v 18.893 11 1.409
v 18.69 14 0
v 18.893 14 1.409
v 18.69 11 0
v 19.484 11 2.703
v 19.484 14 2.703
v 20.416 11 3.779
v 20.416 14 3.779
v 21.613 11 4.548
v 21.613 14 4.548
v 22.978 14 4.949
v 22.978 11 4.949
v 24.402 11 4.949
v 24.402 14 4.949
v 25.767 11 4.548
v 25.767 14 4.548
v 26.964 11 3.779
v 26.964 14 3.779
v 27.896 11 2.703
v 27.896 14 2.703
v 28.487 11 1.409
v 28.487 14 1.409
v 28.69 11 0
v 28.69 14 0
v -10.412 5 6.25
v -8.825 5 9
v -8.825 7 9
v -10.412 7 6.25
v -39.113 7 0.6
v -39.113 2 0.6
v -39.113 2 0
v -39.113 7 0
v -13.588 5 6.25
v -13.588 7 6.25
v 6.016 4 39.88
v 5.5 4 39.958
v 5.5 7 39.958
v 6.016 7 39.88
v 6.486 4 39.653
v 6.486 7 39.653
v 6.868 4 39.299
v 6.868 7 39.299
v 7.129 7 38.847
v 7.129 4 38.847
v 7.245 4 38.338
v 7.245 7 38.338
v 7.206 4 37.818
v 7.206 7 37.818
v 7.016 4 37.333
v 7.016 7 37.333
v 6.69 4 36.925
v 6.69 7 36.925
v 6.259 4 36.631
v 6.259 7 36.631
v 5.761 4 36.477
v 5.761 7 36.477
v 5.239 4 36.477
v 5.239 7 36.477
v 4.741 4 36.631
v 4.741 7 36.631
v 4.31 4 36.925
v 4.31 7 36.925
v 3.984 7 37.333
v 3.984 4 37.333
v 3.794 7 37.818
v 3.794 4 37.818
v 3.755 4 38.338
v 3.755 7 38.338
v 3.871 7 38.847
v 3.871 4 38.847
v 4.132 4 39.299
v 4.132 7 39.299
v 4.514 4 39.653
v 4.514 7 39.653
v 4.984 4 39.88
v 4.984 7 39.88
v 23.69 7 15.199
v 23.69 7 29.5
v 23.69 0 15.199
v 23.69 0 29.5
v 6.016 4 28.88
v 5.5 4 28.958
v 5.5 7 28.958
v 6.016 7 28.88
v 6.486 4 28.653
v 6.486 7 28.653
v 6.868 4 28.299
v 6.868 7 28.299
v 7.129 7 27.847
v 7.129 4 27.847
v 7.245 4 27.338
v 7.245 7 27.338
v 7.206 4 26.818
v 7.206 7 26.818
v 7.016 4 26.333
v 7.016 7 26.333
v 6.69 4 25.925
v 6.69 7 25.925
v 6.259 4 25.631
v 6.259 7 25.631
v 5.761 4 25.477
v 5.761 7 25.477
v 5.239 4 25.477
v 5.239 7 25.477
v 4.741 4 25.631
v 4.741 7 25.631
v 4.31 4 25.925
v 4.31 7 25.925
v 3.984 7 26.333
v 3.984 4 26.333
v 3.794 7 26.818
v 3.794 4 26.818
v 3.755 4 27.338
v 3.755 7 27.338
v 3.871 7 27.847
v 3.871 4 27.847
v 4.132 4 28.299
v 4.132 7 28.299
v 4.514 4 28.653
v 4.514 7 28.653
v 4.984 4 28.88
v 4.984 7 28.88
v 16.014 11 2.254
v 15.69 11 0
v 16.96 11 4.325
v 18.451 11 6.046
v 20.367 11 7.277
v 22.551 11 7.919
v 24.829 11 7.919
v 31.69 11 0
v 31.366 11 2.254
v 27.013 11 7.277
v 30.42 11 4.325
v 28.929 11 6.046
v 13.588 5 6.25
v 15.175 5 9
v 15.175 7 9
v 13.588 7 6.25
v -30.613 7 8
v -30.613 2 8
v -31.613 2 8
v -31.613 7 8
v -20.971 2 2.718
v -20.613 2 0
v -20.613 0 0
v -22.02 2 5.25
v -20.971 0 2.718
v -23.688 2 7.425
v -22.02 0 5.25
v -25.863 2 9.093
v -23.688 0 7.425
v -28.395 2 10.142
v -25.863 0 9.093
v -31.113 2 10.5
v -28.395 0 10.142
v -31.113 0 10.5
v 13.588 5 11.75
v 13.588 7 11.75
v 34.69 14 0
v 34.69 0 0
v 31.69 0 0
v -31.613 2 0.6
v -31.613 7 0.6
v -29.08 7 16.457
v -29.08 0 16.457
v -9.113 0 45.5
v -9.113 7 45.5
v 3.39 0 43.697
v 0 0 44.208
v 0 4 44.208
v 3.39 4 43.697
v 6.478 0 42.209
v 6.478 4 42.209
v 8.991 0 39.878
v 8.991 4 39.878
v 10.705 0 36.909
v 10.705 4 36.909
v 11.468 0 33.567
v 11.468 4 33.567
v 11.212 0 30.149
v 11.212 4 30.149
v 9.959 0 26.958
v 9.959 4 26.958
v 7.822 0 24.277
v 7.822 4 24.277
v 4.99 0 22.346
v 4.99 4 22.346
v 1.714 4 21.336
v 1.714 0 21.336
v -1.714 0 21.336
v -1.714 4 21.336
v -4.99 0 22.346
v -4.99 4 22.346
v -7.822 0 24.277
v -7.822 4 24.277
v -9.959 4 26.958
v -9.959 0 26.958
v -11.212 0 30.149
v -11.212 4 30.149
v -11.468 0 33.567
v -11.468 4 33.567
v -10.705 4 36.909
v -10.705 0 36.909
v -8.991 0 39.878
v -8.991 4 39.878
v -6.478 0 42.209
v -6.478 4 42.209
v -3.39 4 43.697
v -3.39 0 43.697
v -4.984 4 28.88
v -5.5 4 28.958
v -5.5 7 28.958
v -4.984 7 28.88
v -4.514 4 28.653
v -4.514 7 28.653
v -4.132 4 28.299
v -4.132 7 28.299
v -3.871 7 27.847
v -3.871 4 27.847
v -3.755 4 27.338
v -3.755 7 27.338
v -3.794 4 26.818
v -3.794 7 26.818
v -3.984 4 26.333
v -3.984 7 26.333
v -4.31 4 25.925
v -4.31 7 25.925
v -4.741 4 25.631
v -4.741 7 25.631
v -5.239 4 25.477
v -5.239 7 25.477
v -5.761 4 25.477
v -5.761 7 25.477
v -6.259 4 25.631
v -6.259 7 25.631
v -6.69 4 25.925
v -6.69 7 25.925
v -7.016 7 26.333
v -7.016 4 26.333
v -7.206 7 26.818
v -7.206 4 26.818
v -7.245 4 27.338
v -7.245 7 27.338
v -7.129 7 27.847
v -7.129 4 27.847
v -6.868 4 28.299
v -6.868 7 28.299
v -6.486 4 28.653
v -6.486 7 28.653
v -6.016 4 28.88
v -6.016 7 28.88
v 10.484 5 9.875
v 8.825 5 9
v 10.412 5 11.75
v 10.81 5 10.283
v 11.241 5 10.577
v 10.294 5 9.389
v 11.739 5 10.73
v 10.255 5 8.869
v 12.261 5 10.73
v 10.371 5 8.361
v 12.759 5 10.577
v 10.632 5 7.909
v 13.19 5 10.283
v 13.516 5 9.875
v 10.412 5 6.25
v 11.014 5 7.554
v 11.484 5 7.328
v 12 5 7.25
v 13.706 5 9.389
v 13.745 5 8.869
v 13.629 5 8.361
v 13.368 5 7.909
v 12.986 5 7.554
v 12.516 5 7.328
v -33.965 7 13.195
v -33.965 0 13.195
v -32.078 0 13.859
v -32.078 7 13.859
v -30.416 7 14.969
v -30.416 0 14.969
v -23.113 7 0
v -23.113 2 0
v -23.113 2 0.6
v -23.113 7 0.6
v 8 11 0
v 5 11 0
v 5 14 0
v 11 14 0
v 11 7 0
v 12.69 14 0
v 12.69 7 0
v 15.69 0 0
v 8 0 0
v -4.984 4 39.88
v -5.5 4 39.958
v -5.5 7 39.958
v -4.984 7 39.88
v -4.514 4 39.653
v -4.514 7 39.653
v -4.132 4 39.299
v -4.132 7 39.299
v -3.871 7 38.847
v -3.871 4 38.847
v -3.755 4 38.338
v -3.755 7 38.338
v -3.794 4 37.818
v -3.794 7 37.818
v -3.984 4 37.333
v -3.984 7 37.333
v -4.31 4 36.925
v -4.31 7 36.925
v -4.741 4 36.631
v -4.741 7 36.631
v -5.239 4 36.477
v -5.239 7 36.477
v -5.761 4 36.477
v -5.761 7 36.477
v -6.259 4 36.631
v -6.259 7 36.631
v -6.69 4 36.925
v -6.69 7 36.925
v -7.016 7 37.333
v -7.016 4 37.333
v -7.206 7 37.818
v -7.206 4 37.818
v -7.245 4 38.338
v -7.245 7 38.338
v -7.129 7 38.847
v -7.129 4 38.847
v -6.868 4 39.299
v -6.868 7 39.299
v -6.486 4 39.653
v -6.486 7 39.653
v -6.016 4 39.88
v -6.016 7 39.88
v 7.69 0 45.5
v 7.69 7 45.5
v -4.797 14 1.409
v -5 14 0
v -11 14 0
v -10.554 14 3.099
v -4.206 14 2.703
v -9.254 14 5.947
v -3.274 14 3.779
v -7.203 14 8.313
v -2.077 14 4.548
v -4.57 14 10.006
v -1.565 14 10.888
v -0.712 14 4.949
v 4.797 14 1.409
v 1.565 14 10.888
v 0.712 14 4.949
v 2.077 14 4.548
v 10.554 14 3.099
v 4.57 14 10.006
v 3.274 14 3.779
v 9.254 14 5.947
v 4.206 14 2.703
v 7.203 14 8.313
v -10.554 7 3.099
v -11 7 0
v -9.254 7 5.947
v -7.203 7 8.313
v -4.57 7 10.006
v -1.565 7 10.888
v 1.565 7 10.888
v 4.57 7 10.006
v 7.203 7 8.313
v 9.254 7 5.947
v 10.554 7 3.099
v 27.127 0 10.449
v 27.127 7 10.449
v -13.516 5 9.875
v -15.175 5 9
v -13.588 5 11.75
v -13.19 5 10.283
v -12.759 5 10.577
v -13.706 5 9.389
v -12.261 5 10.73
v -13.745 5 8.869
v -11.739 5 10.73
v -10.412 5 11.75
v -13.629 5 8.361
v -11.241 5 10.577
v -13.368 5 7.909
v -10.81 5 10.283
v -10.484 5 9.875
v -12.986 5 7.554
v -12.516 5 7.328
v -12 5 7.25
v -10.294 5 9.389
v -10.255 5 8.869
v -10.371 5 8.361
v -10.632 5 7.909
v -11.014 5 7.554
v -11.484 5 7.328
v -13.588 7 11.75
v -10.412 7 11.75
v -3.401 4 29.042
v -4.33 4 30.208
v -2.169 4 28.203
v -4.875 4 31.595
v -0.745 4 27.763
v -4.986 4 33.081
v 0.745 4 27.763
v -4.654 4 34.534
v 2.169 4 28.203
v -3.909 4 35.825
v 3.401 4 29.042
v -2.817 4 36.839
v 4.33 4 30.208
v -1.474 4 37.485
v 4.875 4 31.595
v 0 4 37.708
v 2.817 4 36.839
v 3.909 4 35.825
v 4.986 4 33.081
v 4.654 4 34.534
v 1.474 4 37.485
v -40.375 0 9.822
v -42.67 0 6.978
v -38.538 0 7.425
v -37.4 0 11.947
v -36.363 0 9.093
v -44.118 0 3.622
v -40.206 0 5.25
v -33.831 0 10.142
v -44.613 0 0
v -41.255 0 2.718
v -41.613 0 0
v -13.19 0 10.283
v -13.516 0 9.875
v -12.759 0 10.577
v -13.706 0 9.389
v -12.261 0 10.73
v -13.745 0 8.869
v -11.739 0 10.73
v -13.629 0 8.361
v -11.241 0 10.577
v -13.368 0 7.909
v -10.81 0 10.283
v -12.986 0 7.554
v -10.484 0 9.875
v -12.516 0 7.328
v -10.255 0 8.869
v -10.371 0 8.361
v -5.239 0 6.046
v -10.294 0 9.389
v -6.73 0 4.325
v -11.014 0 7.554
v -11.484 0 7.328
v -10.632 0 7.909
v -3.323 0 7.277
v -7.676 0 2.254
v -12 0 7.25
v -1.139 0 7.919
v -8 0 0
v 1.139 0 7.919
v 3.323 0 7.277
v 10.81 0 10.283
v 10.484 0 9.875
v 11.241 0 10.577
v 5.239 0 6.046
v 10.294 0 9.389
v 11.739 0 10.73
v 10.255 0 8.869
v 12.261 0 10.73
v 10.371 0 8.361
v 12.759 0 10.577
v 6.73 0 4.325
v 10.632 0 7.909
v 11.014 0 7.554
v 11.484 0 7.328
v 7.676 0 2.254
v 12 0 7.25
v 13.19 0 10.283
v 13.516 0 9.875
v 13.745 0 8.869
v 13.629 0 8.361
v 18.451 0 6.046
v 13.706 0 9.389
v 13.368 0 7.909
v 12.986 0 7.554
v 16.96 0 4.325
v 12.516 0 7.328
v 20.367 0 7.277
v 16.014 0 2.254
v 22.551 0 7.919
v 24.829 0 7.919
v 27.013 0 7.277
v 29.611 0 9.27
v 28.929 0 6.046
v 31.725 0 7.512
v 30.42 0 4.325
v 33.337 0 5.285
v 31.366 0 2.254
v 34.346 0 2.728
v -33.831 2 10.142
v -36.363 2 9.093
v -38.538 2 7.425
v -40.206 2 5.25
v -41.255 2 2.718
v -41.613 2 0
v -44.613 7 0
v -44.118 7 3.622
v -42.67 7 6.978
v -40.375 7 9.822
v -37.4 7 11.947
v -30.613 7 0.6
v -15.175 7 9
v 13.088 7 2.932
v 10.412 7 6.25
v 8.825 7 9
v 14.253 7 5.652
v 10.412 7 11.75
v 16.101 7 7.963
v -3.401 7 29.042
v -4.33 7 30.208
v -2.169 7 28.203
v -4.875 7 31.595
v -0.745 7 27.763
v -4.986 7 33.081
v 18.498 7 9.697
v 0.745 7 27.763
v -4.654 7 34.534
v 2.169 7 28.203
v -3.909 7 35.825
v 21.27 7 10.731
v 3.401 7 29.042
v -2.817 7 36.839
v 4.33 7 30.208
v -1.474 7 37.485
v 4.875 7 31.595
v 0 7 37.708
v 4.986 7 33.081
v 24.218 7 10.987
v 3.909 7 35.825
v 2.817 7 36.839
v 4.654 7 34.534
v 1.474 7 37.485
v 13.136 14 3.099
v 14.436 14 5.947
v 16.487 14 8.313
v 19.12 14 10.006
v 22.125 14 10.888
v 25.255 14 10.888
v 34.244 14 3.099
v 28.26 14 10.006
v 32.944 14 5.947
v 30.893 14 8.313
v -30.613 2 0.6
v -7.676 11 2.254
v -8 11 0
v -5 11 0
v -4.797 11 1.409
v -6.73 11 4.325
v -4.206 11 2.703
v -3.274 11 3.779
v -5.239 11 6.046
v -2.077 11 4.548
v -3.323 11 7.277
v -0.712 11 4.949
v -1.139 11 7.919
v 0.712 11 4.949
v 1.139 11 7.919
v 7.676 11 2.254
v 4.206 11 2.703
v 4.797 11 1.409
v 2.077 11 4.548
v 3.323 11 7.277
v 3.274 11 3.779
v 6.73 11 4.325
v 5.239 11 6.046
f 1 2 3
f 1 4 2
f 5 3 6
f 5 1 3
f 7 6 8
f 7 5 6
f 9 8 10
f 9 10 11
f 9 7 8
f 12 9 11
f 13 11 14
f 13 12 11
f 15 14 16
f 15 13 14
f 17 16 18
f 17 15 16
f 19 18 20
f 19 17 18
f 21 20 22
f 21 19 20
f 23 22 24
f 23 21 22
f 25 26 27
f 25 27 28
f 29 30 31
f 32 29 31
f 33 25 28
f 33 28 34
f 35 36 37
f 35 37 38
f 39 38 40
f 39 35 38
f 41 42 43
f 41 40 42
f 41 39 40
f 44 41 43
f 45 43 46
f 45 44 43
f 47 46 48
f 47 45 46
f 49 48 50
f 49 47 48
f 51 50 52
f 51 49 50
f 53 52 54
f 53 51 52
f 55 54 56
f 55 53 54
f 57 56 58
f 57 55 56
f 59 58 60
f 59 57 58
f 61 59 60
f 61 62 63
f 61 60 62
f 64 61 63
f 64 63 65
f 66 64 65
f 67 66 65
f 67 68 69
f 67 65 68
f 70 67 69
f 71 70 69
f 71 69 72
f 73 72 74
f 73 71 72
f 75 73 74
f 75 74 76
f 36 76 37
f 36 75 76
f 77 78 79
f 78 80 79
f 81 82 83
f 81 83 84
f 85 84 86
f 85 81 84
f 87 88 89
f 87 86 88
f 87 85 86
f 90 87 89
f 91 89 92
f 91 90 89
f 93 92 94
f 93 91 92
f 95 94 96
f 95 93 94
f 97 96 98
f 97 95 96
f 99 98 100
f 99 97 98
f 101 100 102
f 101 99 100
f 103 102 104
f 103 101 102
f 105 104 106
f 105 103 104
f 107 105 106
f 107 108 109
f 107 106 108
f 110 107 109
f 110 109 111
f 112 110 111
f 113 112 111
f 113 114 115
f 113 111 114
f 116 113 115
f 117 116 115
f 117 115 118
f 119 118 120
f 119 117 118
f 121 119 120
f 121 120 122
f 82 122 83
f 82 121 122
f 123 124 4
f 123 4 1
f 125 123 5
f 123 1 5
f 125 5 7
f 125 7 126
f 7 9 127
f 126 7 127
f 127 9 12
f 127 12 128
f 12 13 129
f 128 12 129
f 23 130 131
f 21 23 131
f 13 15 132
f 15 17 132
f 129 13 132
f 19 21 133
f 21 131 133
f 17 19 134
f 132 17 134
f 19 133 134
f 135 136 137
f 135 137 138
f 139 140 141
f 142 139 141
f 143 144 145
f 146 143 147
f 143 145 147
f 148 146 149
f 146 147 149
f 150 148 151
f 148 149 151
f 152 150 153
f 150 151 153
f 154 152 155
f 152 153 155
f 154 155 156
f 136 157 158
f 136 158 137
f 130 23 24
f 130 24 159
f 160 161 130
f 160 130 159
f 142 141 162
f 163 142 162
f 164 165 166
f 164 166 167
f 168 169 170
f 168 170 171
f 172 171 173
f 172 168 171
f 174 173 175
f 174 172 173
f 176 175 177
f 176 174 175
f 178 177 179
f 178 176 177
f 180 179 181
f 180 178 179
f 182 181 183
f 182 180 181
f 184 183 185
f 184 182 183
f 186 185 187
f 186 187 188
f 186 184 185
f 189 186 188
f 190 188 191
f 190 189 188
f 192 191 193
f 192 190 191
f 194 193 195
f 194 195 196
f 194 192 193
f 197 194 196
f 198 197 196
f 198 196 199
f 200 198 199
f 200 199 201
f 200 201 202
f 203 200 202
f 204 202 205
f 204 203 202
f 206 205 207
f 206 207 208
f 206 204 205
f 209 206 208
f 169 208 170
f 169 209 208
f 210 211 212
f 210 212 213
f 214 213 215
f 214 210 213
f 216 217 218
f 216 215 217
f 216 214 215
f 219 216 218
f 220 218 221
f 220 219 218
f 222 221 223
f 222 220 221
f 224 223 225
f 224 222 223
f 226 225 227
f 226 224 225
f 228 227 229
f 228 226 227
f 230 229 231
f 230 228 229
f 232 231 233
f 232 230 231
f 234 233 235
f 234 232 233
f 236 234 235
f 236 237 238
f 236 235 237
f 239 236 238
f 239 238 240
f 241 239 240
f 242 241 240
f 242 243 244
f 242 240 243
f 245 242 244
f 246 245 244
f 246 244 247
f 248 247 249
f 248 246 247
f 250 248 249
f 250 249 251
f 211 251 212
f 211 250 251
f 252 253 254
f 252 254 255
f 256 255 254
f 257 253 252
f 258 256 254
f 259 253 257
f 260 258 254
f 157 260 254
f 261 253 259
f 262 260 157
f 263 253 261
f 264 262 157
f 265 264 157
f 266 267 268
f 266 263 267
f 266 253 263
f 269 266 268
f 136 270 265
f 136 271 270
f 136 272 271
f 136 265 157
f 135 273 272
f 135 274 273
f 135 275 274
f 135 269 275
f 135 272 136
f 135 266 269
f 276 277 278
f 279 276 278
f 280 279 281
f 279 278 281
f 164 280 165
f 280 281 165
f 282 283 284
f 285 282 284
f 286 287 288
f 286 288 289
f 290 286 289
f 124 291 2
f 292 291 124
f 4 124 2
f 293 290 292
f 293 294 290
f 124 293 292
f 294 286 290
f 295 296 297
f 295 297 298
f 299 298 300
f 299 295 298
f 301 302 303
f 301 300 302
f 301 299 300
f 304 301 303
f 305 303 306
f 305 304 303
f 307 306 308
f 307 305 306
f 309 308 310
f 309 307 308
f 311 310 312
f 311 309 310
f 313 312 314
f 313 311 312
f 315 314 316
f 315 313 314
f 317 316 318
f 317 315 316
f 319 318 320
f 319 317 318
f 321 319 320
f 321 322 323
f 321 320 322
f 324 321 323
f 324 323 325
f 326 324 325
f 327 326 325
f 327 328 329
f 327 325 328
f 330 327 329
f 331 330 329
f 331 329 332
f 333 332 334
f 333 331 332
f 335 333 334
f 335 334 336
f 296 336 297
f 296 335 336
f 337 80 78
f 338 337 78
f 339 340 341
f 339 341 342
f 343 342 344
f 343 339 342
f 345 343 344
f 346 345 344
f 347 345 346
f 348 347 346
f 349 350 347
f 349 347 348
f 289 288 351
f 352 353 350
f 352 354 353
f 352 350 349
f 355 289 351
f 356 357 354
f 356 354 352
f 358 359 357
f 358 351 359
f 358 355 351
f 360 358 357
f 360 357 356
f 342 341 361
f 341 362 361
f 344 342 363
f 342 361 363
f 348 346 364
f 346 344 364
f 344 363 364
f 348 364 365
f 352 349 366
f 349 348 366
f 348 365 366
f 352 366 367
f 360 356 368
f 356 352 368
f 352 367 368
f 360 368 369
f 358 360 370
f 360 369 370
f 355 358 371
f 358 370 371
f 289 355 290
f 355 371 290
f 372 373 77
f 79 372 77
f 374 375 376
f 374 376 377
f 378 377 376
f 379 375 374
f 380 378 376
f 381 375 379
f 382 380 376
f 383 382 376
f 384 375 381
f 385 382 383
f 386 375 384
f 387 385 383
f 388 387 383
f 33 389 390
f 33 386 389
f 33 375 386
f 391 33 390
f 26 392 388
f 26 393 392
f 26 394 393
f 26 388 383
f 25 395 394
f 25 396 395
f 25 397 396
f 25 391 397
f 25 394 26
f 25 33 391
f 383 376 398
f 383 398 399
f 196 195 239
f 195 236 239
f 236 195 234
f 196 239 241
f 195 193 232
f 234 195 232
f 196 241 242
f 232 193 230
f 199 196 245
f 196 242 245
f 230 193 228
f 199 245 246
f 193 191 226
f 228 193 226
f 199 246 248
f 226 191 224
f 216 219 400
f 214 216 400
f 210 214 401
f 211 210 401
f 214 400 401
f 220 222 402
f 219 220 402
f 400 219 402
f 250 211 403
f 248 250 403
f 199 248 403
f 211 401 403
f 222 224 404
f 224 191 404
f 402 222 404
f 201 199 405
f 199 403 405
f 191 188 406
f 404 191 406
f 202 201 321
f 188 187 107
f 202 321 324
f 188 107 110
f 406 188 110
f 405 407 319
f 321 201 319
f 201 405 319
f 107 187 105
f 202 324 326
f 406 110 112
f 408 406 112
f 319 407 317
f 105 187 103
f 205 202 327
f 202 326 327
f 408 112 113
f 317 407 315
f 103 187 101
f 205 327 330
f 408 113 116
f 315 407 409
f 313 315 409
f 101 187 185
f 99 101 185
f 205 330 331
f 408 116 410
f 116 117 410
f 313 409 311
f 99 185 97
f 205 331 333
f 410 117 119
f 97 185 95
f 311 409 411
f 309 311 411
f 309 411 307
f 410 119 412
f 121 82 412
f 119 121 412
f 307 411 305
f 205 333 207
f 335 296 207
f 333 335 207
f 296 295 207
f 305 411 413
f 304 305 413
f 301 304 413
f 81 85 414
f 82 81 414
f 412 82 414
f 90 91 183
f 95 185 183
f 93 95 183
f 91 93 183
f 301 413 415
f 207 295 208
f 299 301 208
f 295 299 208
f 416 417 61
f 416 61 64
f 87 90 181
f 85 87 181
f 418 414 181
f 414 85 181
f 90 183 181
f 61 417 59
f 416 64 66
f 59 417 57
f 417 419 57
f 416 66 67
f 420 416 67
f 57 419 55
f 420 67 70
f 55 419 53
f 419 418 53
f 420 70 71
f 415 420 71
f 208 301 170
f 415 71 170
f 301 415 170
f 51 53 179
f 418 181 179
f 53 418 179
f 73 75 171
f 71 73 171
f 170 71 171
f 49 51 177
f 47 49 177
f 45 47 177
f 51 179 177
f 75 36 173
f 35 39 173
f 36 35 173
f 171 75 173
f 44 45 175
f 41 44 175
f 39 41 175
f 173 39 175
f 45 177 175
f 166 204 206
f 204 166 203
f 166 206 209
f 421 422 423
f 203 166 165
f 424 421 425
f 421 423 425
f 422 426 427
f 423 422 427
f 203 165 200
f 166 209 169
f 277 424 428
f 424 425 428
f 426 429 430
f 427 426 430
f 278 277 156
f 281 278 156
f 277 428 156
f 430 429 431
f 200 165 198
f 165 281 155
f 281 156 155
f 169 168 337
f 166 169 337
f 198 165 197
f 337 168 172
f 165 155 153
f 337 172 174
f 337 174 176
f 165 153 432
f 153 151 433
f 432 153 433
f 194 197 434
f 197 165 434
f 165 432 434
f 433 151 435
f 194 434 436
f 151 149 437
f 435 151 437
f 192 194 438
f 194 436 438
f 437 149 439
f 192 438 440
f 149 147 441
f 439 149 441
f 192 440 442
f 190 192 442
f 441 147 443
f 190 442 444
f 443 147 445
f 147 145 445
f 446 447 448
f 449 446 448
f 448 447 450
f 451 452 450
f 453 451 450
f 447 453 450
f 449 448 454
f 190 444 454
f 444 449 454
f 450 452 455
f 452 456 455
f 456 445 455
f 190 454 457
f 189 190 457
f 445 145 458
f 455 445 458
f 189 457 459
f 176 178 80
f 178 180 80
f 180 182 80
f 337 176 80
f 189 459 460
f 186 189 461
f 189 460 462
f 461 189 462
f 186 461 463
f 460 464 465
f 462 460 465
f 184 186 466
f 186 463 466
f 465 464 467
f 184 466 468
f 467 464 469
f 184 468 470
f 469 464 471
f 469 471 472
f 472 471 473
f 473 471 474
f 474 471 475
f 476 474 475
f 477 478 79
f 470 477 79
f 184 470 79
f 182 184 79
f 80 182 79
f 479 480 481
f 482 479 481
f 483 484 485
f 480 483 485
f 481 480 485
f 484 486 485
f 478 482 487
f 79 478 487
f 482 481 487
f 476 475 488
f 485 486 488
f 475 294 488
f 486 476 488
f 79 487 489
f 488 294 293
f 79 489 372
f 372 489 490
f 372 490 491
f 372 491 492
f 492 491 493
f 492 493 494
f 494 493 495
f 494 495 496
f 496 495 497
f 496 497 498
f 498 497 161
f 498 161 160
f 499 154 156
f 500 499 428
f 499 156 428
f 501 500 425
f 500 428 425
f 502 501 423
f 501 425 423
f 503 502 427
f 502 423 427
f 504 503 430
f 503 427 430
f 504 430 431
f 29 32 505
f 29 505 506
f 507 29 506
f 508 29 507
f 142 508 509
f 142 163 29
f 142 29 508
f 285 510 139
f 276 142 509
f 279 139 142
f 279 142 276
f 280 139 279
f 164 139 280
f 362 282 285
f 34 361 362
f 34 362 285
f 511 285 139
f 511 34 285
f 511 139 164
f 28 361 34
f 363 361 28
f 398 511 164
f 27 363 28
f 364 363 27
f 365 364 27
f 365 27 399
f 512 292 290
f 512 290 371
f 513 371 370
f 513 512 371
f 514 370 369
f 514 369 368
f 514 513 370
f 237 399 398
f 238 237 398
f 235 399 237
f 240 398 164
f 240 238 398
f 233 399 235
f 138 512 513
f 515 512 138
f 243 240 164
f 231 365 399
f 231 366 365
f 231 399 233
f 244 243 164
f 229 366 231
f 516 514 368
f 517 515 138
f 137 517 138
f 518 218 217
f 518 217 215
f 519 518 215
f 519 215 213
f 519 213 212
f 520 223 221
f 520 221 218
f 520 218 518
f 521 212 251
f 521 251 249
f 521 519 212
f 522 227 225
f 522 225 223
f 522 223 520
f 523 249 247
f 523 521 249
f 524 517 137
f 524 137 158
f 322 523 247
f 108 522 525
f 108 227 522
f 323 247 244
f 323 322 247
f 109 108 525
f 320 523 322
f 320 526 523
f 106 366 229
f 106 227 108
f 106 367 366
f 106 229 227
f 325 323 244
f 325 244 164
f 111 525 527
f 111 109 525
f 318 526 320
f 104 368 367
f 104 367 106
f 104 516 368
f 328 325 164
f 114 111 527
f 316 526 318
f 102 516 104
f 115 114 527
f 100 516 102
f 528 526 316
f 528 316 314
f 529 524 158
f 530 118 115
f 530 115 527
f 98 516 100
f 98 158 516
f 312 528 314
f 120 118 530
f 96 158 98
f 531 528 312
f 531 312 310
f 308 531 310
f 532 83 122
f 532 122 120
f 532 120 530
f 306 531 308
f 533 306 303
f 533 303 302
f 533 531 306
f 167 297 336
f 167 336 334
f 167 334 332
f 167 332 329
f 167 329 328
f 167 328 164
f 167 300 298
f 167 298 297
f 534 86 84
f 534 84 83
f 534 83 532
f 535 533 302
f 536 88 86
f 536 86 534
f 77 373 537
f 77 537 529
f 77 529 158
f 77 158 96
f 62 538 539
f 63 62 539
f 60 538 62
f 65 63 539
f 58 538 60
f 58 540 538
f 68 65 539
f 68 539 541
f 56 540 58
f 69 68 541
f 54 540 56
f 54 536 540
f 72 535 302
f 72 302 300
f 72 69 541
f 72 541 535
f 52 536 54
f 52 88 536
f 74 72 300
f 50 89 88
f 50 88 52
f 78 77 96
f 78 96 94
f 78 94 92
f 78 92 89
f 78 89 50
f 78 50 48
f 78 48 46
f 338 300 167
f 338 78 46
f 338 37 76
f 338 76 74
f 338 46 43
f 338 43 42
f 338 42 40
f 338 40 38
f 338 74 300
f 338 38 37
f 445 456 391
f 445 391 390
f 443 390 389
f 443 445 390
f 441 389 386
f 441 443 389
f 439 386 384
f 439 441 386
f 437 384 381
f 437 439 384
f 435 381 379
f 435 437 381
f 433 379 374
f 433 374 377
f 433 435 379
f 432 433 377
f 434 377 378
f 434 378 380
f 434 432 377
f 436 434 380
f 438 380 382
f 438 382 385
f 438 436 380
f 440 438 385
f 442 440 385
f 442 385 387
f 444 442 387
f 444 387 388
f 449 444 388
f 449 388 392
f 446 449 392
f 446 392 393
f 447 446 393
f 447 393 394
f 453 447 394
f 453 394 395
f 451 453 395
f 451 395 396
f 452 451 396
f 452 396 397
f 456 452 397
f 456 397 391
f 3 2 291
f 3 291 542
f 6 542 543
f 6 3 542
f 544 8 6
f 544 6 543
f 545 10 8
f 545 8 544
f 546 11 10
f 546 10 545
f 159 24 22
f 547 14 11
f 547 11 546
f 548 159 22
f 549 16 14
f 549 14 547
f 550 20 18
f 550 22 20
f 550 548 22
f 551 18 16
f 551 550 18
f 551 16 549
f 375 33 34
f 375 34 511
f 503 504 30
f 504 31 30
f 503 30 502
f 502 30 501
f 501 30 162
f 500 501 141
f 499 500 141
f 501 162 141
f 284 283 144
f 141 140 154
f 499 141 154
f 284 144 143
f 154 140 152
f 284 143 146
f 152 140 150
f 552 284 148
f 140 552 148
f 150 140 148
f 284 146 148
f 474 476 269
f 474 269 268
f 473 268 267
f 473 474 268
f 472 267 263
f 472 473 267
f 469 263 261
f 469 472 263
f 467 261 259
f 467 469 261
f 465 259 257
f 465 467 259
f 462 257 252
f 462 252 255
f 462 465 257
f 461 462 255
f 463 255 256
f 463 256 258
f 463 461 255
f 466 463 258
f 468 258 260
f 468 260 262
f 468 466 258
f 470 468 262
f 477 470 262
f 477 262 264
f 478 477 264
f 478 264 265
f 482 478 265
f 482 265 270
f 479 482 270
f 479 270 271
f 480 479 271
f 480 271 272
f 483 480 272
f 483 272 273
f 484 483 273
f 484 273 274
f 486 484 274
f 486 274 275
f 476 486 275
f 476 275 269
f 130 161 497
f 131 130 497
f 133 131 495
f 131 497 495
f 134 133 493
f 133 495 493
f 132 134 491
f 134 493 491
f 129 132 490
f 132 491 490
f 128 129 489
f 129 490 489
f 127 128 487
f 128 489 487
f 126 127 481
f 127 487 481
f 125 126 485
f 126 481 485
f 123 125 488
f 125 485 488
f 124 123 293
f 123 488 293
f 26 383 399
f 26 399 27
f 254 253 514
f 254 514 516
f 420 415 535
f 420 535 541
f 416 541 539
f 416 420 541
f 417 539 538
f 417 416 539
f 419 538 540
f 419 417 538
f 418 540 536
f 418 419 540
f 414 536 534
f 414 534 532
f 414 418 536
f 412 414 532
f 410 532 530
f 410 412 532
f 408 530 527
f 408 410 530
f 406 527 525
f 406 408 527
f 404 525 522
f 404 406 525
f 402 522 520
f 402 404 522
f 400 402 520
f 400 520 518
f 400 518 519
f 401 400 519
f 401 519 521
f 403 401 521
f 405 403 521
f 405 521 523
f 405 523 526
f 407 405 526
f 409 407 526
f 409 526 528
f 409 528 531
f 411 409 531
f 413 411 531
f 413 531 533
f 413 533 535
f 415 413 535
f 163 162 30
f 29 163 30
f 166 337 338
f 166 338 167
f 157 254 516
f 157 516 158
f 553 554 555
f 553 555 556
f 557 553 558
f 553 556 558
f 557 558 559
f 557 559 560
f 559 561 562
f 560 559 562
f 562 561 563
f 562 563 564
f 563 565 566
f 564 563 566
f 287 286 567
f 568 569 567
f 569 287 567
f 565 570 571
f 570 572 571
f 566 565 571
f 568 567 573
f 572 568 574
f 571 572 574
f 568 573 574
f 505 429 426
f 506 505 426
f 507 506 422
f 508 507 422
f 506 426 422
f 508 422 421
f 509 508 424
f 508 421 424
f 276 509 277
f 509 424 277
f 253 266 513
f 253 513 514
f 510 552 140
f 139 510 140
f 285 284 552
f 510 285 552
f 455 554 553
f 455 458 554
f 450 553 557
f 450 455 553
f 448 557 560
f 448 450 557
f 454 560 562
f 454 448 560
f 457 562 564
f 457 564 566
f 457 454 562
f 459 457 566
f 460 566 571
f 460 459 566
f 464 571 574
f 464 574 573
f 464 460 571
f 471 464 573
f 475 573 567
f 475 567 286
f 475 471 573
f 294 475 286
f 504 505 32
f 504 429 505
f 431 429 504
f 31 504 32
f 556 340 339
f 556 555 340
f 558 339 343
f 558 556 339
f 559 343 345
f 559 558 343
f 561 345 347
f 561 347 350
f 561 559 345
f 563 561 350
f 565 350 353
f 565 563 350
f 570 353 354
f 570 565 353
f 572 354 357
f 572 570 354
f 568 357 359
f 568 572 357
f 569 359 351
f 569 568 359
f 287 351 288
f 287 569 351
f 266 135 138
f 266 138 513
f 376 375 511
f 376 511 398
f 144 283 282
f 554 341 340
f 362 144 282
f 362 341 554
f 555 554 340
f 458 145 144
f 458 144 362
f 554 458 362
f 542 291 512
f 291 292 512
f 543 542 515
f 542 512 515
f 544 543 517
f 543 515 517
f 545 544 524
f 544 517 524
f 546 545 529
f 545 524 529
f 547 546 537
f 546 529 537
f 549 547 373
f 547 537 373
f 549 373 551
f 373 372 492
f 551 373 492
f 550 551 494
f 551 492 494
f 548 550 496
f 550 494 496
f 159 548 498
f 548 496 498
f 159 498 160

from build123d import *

# Parameters (mm, degrees)
SKETCH3_R               = 8
SKETCH3_R_2             = 5.000000000000001
BOSS_EXTRUDE1_DEPTH     = 7
CUT_EXTRUDE3_DEPTH      = 65.10592616131524
CUT_EXTRUDE3_DEPTH_BACK = 65.10592616131524
SKETCH4_R               = 1.7500000000000004
SKETCH4_R_2             = 1.7500000000000013
SKETCH6_R               = 10.999999999999993
SKETCH6_R_2             = 7.999999999999998
SKETCH6_R_3             = 11
SKETCH6_R_4             = 8
BOSS_EXTRUDE2_DEPTH     = 4
SKETCH7_R               = 10.999999999999993
SKETCH7_R_2             = 5.000000000000001
SKETCH7_R_3             = 11
SKETCH7_R_4             = 5
BOSS_EXTRUDE3_DEPTH     = 3
CHAMFER1_SIZE           = 2.5
CUT_EXTRUDE5_DEPTH      = 66.242392422412
CUT_EXTRUDE5_DEPTH_BACK = 66.242392422412
SKETCH9_R               = 1.7499999999999998
CUT_EXTRUDE6_START      = -2
SKETCH10_R              = 1.7499999999999998
CUT_EXTRUDE6_DEPTH      = 2
CHAMFER3_SIZE2          = 32
CHAMFER3_SIZE           = 22
CHAMFER4_SIZE           = 16
FILLET1_DEPTH           = 7
BOSS_EXTRUDE6_START     = -5
SKETCH15_R              = 10.499999999999996
BOSS_EXTRUDE6_DEPTH     = 5
CUT_EXTRUDE7_DEPTH      = 66.24239242241201
CUT_EXTRUDE7_DEPTH_BACK = 66.24239242241201
SKETCH16_W              = 93.91132691471782
SKETCH16_H              = 20.326896629745406
SKETCH17_R              = 11.5
SKETCH17_R_2            = 5.0000000000000036
CUT_EXTRUDE8_DEPTH      = 4


with BuildPart() as part:
    # Sketch3 → Boss-Extrude1 (new body)
    # profile 1 of 10: a face of its own
    with BuildSketch(Plane(origin=(0, 0, 0), x_dir=(1, 0, 0), z_dir=(0, 1, 0))):
        with BuildLine():
            ThreePointArc((-17.613, 0), (-21.567058453981605, 9.545941546018392), (-31.113, 13.500000000000002))
            Line((-31.113, 13.5), (-31.113, 10.499999999999996))
            ThreePointArc((-31.11300000000032, 10.499999999999996), (-23.688378797541365, 7.424621202458859), (-20.613000000000003, 0))
            ThreePointArc((-20.613000000000003, -2.57e-15), (-23.688378797541368, -7.4246212024588605), (-31.11300000000031, -10.499999999999996))
            Line((-31.112999999999992, -10.499999999999996), (-31.112999999999992, -13.500000000000007))
            ThreePointArc((-31.11299999999999, -13.500000000000002), (-21.567058453981602, -9.545941546018385), (-17.613, -3.31e-15))
        make_face()
    # profile 2 of 10: a face of its own
    with BuildSketch(Plane(origin=(0, 0, 0), x_dir=(1, 0, 0), z_dir=(0, 1, 0))):
        with BuildLine():
            Line((-31.113, 10.499999999999996), (-31.113, 13.5))
            ThreePointArc((-31.113, 13.500000000000002), (-44.613, -4.34e-15), (-31.11299999999999, -13.500000000000002))
            Line((-31.112999999999992, -13.500000000000007), (-31.112999999999992, -10.499999999999996))
            ThreePointArc((-31.11300000000031, -10.499999999999996), (-41.613, -8.04e-15), (-31.11300000000032, 10.499999999999996))
        make_face()
    # profile 3 of 10: a face of its own
    with BuildSketch(Plane(origin=(0, 0, 0), x_dir=(1, 0, 0), z_dir=(0, 1, 0))):
        with BuildLine():
            Line((23.690000000000005, 13.500000000000002), (-31.113, 13.5))
            ThreePointArc((-31.113, 13.500000000000002), (-21.567058453981605, 9.545941546018392), (-17.613, 0))
            ThreePointArc((-17.613, -3.31e-15), (-21.567058453981602, -9.545941546018385), (-31.11299999999999, -13.500000000000002))
            Line((-31.112999999999992, -13.500000000000005), (23.690000000000005, -13.499999999999998))
            Line((23.690000000000005, -13.499999999999998), (23.690000000000005, -10.999999999999991))
            ThreePointArc((23.689999999999998, -10.999999999999993), (12.690000000000008, 1.112e-14), (23.690000000000015, 10.999999999999993))
            Line((23.690000000000005, 10.999999999999993), (23.690000000000005, 13.500000000000002))
        make_face()
        with Locations(Location((0, 0, 0), (0, 0, 270))):
            Circle(SKETCH3_R, mode=Mode.SUBTRACT)
    # profile 4 of 10: a face of its own
    with BuildSketch(Plane(origin=(0, 0, 0), x_dir=(1, 0, 0), z_dir=(0, 1, 0))):
        with BuildLine():
            ThreePointArc((-17.613, 0), (-21.567058453981605, 9.545941546018392), (-31.113, 13.500000000000002))
            Line((-31.113, 13.5), (-31.113, 10.499999999999996))
            ThreePointArc((-31.11300000000032, 10.499999999999996), (-23.688378797541365, 7.424621202458859), (-20.613000000000003, 0))
            ThreePointArc((-20.613000000000003, -2.57e-15), (-23.688378797541368, -7.4246212024588605), (-31.11300000000031, -10.499999999999996))
            Line((-31.112999999999992, -10.499999999999996), (-31.112999999999992, -13.500000000000007))
            ThreePointArc((-31.11299999999999, -13.500000000000002), (-21.567058453981602, -9.545941546018385), (-17.613, -3.31e-15))
        make_face()
    # profile 5 of 10: a face of its own
    with BuildSketch(Plane(origin=(0, 0, 0), x_dir=(1, 0, 0), z_dir=(0, 1, 0))):
        with BuildLine():
            Line((-31.113, 10.499999999999996), (-31.113, 13.5))
            ThreePointArc((-31.113, 13.500000000000002), (-44.613, -4.34e-15), (-31.11299999999999, -13.500000000000002))
            Line((-31.112999999999992, -13.500000000000007), (-31.112999999999992, -10.499999999999996))
            ThreePointArc((-31.11300000000031, -10.499999999999996), (-41.613, -8.04e-15), (-31.11300000000032, 10.499999999999996))
        make_face()
    # profile 6 of 10: a face of its own
    with BuildSketch(Plane(origin=(0, 0, 0), x_dir=(1, 0, 0), z_dir=(0, 1, 0))):
        with BuildLine():
            ThreePointArc((34.69, 0), (31.468174593052026, 7.778174593052012), (23.690000000000015, 10.999999999999993))
            Line((23.690000000000005, 10.999999999999993), (23.690000000000005, 7.999999999999998))
            ThreePointArc((23.689999999999863, 7.999999999999998), (29.34685424949233, 5.6568542494924285), (31.689999999999998, 0))
            ThreePointArc((31.689999999999998, -1.96e-15), (29.34685424949233, -5.65685424949243), (23.68999999999986, -7.999999999999998))
            Line((23.690000000000005, -7.999999999999998), (23.690000000000005, -10.999999999999991))
            ThreePointArc((23.689999999999998, -10.999999999999993), (31.468174593052016, -7.77817459305202), (34.69, -2.69e-15))
        make_face()
    # profile 7 of 10: a face of its own
    with BuildSketch(Plane(origin=(0, 0, 0), x_dir=(1, 0, 0), z_dir=(0, 1, 0))):
        with BuildLine():
            Line((23.690000000000005, 7.999999999999998), (23.690000000000005, 10.999999999999993))
            ThreePointArc((23.690000000000015, 10.999999999999993), (12.690000000000008, 1.112e-14), (23.689999999999998, -10.999999999999993))
            Line((23.690000000000005, -10.999999999999991), (23.690000000000005, -7.999999999999998))
            ThreePointArc((23.68999999999986, -7.999999999999998), (15.690000000000003, 9.8e-16), (23.689999999999863, 7.999999999999998))
        make_face()
    # profile 8 of 10: a face of its own
    with BuildSketch(Plane(origin=(0, 0, 0), x_dir=(1, 0, 0), z_dir=(0, 1, 0))):
        Polygon((-31.112999999999992, -13.500000000000005), (23.690000000000005, -13.499999999999998), (23.690000000000005, -45.5), (-31.11299999999999, -45.5), align=None)
        with Locations(Location((0, -32.70757493091458, 0), (0, 0, 270))):
            Circle(SKETCH3_R_2, mode=Mode.SUBTRACT)
    # profile 9 of 10: a face of its own
    with BuildSketch(Plane(origin=(0, 0, 0), x_dir=(1, 0, 0), z_dir=(0, 1, 0))):
        with BuildLine():
            ThreePointArc((34.69, 0), (31.468174593052026, 7.778174593052012), (23.690000000000015, 10.999999999999993))
            Line((23.690000000000005, 10.999999999999993), (23.690000000000005, 7.999999999999998))
            ThreePointArc((23.689999999999863, 7.999999999999998), (29.34685424949233, 5.6568542494924285), (31.689999999999998, 0))
            ThreePointArc((31.689999999999998, -1.96e-15), (29.34685424949233, -5.65685424949243), (23.68999999999986, -7.999999999999998))
            Line((23.690000000000005, -7.999999999999998), (23.690000000000005, -10.999999999999991))
            ThreePointArc((23.689999999999998, -10.999999999999993), (31.468174593052016, -7.77817459305202), (34.69, -2.69e-15))
        make_face()
    # profile 10 of 10: a face of its own
    with BuildSketch(Plane(origin=(0, 0, 0), x_dir=(1, 0, 0), z_dir=(0, 1, 0))):
        with BuildLine():
            Line((23.690000000000005, 7.999999999999998), (23.690000000000005, 10.999999999999993))
            ThreePointArc((23.690000000000015, 10.999999999999993), (12.690000000000008, 1.112e-14), (23.689999999999998, -10.999999999999993))
            Line((23.690000000000005, -10.999999999999991), (23.690000000000005, -7.999999999999998))
            ThreePointArc((23.68999999999986, -7.999999999999998), (15.690000000000003, 9.8e-16), (23.689999999999863, 7.999999999999998))
        make_face()
    extrude(amount=BOSS_EXTRUDE1_DEPTH)

    # Sketch4 → Cut-Extrude3 (cut, two sides: drawn at the far end of the back side and taken through both)
    with BuildSketch(Plane(origin=(0, 0, 0), x_dir=(1, 0, 0), z_dir=(0, 1, 0)).offset(-CUT_EXTRUDE3_DEPTH_BACK)):
        with Locations(Location((5.5, -27.207574930914586, 0), (0, 0, 270))):
            Circle(SKETCH4_R)
        with Locations(Location((5.5, -38.20757493091458, 0), (0, 0, 270))):
            Circle(SKETCH4_R_2)
        with Locations(Location((-5.5, -38.20757493091458, 0), (0, 0, 270))):
            Circle(SKETCH4_R_2)
        with Locations(Location((-5.5, -27.207574930914586, 0), (0, 0, 270))):
            Circle(SKETCH4_R)
    extrude(amount=CUT_EXTRUDE3_DEPTH + CUT_EXTRUDE3_DEPTH_BACK, mode=Mode.SUBTRACT)

    # Sketch6 → Boss-Extrude2 (add)
    # profile 1 of 2: a face of its own
    with BuildSketch(Plane(origin=(0, 7, 0), x_dir=(1, 0, 0), z_dir=(0, 1, 0))):
        with Locations(Location((23.69, 0, 0), (0, 0, 270))):
            Circle(SKETCH6_R)
        with Locations(Location((23.69, 0, 0), (0, 0, 270))):
            Circle(SKETCH6_R_2, mode=Mode.SUBTRACT)
    # profile 2 of 2: a face of its own
    with BuildSketch(Plane(origin=(0, 7, 0), x_dir=(1, 0, 0), z_dir=(0, 1, 0))):
        with Locations(Location((0, 0, 0), (0, 0, 270))):
            Circle(SKETCH6_R_3)
        with Locations(Location((0, 0, 0), (0, 0, 270))):
            Circle(SKETCH6_R_4, mode=Mode.SUBTRACT)
    extrude(amount=BOSS_EXTRUDE2_DEPTH)

    # Sketch7 → Boss-Extrude3 (add)
    # profile 1 of 2: a face of its own
    with BuildSketch(Plane(origin=(0, 11, 0), x_dir=(1, 0, 0), z_dir=(0, 1, 0))):
        with Locations(Location((23.69, 0, 0), (0, 0, 270))):
            Circle(SKETCH7_R)
        with Locations(Location((23.69, 0, 0), (0, 0, 270))):
            Circle(SKETCH7_R_2, mode=Mode.SUBTRACT)
    # profile 2 of 2: a face of its own
    with BuildSketch(Plane(origin=(0, 11, 0), x_dir=(1, 0, 0), z_dir=(0, 1, 0))):
        with Locations(Location((0, 0, 0), (0, 0, 270))):
            Circle(SKETCH7_R_3)
        with Locations(Location((0, 0, 0), (0, 0, 270))):
            Circle(SKETCH7_R_4, mode=Mode.SUBTRACT)
    extrude(amount=BOSS_EXTRUDE3_DEPTH)

    # Chamfer1
    # the kernel refuses this chamfer: 2.5 mm, written as the material it adds along each edge
    with BuildSketch(Plane(origin=(23.690000000000012, 0, -10.999999999999993), x_dir=(0.9912092295509807, 0, 0.13230367815352426), z_dir=(0, 1, 0))) as chamfer1_piece_1_section:
        with BuildLine():
            Line((2.910680919377515, 1e-17), (-CHAMFER1_SIZE * 0.132303678154, CHAMFER1_SIZE * 0.991209229551))
            Line((-CHAMFER1_SIZE * 0.132303678154, CHAMFER1_SIZE * 0.991209229551), (0, 0))
            ThreePointArc((0, 0), (1.4955265802521478, 0.09662506904492212), (2.910680919377515, 1e-17))
        make_face()
    chamfer1_piece_1 = extrude(amount=7, mode=Mode.PRIVATE)
    chamfer1_piece_1 = split(chamfer1_piece_1, bisect_by=Plane(origin=(23.690000000000012, 0, -13.500000000000002), z_dir=(3e-17, 0, 1)), keep=Keep.TOP, mode=Mode.PRIVATE)
    add(chamfer1_piece_1)

    # Sketch9 → Cut-Extrude5 (cut, two sides: drawn at the far end of the back side and taken through both)
    with BuildSketch(Plane(origin=(0, 0, 0), x_dir=(1, 0, 0), z_dir=(0, 1, 0)).offset(-CUT_EXTRUDE5_DEPTH_BACK)):
        with Locations(Location((12, 9, 0), (0, 0, 90))):
            Circle(SKETCH9_R)
        with Locations(Location((12, -9, 0), (0, 0, 90))):
            Circle(SKETCH9_R)
        with Locations(Location((-12, -9, 0), (0, 0, 90))):
            Circle(SKETCH9_R)
        with Locations(Location((-12, 9, 0), (0, 0, 90))):
            Circle(SKETCH9_R)
    extrude(amount=CUT_EXTRUDE5_DEPTH + CUT_EXTRUDE5_DEPTH_BACK, mode=Mode.SUBTRACT)

    # Sketch10 → Cut-Extrude6 (cut)
    # profile 1 of 4: a face of its own
    with BuildSketch(Plane(origin=(0, 7, 0), x_dir=(1, 0, 0), z_dir=(0, 1, 0)).offset(CUT_EXTRUDE6_START)):
        Polygon((-15.17542648054294, -9.000000000000002), (-13.587713240271471, -11.749999999999998), (-10.412286759728527, -11.749999999999998), (-8.824573519457056, -8.999999999999998), (-10.412286759728529, -6.249999999999998), (-13.58771324027147, -6.249999999999998), align=None)
        with Locations(Location((-12, -9, 0), (0, 0, 90))):
            Circle(SKETCH10_R, mode=Mode.SUBTRACT)
    # profile 2 of 4: a face of its own
    with BuildSketch(Plane(origin=(0, 7, 0), x_dir=(1, 0, 0), z_dir=(0, 1, 0)).offset(CUT_EXTRUDE6_START)):
        Polygon((-15.17542648054294, 8.999999999999998), (-13.587713240271473, 6.249999999999999), (-10.41228675972853, 6.249999999999999), (-8.824573519457058, 9), (-10.412286759728529, 11.75), (-13.587713240271468, 11.75), align=None)
        with Locations(Location((-12, 9, 0), (0, 0, 90))):
            Circle(SKETCH10_R, mode=Mode.SUBTRACT)
    # profile 3 of 4: a face of its own
    with BuildSketch(Plane(origin=(0, 7, 0), x_dir=(1, 0, 0), z_dir=(0, 1, 0)).offset(CUT_EXTRUDE6_START)):
        Polygon((15.175426480542939, 8.999999999999998), (13.587713240271471, 11.749999999999996), (10.412286759728532, 11.749999999999996), (8.82457351945706, 8.999999999999995), (10.412286759728527, 6.249999999999997), (13.58771324027147, 6.249999999999997), align=None)
        with Locations(Location((12, 9, 0), (0, 0, 90))):
            Circle(SKETCH10_R, mode=Mode.SUBTRACT)
    # profile 4 of 4: a face of its own
    with BuildSketch(Plane(origin=(0, 7, 0), x_dir=(1, 0, 0), z_dir=(0, 1, 0)).offset(CUT_EXTRUDE6_START)):
        Polygon((15.17542648054294, -9.000000000000002), (13.58771324027147, -6.249999999999999), (10.41228675972853, -6.249999999999999), (8.824573519457058, -9.000000000000002), (10.41228675972853, -11.75), (13.587713240271471, -11.75), align=None)
        with Locations(Location((12, -9, 0), (0, 0, 90))):
            Circle(SKETCH10_R, mode=Mode.SUBTRACT)
    extrude(amount=CUT_EXTRUDE6_DEPTH, mode=Mode.SUBTRACT)

    # Chamfer2
    # the kernel refuses this chamfer: 5 mm, written as the material it adds along each edge
    with BuildSketch(Plane(origin=(23.69, 0, 10.999999999999993), x_dir=(0.9874000606639179, 0, -0.15824386307497393), z_dir=(0, 1, 0))) as chamfer2_piece_1:
        with BuildLine():
            Line((3.622786343886572, 0.1414213562374673), (-0.8058373565311953, -4.287202344190177))
            Line((-0.8058373565311953, -4.287202344190177), (-0.9045773625975885, -4.27137795788268))
            ThreePointArc((-0.9045773625975885, -4.27137795788268), (-0.4437672242597131, -2.1370546546533555), (-0.0987400060663932, 0.01582438630749762))
            Line((-0.0987400060663932, 0.01582438630749762), (0.01582438630749734, 0.09874000606639144))
            ThreePointArc((0.01582438630749734, 0.09874000606639144), (1.8121079396960726, -0.03836531209673867), (3.6069619575790735, 0.24016136230385873))
            Line((3.6069619575790735, 0.24016136230385873), (3.622786343886572, 0.1414213562374673))
        make_face()
    extrude(amount=7)

    # Chamfer3
    chamfer3_edges = [part.edges().sort_by_distance(p)[0] for p in [
        (-31.11299999999999, 3.5, 45.5),
    ]]
    chamfer3_side = [part.faces().sort_by_distance(p)[0] for p in [
        (-30.672999999999988, 3.5, 45.5),
    ]]
    chamfer(chamfer3_edges, length=CHAMFER3_SIZE - 0.0001, length2=CHAMFER3_SIZE2 - 0.0001, reference=chamfer3_side[0])  # a hair under: the kernel refuses the full size

    # Chamfer4
    chamfer4_edges = [part.edges().sort_by_distance(p)[0] for p in [
        (23.690000000000005, 3.5, 45.5),
    ]]
    chamfer(chamfer4_edges, length=CHAMFER4_SIZE)

    # Fillet1: read off the stored shape, not the designer's step
    # Fillet1 outline → Fillet1 (add)
    with BuildSketch(Plane(origin=(0, 0, 0), x_dir=(1, 0, 0), z_dir=(0, 1, 0))):
        with BuildLine():
            ThreePointArc((-31.113, -13.5), (-32.547033058, -13.423619079), (-33.96483904, -13.19534062))
            ThreePointArc((-33.96483904, -13.19534062), (-31.199410591, -14.370304214), (-29.062482337, -16.482571146))
            Line((-29.062482337, -16.482571146), (-31.113, -13.5))
        make_face()
    extrude(amount=FILLET1_DEPTH)

    # Sketch15 → Boss-Extrude6 (add)
    with BuildSketch(Plane(origin=(0, 7, 0), x_dir=(1, 0, 0), z_dir=(0, 1, 0)).offset(BOSS_EXTRUDE6_START)):
        with Locations(Location((-31.113, 0, 0), (0, 0, 270))):
            Circle(SKETCH15_R)
        Polygon((-31.613000000000003, 0.5999999999999996), (-31.613000000000003, 7.999999999999978), (-30.613, 7.999999999999978), (-30.613, 0.5999999999999996), (-23.112999999999996, 0.5999999999999999), (-23.112999999999996, -0.6000000000000001), (-30.613, -0.6000000000000001), (-30.612999999999996, -8.000000000000021), (-31.613000000000003, -8.000000000000023), (-31.613000000000003, -0.6000000000000005), (-39.11299999999999, -0.6000000000000001), (-39.11299999999999, 0.5999999999999999), align=None, mode=Mode.SUBTRACT)
    extrude(amount=BOSS_EXTRUDE6_DEPTH)

    # Sketch16 → Cut-Extrude7 (cut, two sides: drawn at the far end of the back side and taken through both)
    with BuildSketch(Plane(origin=(0, 0, 0), x_dir=(1, 0, 0), z_dir=(0, 1, 0)).offset(-CUT_EXTRUDE7_DEPTH_BACK)):
        with Locations((-7.1890270506767, 10.163448314872703)):
            Rectangle(SKETCH16_W, SKETCH16_H)
    extrude(amount=CUT_EXTRUDE7_DEPTH + CUT_EXTRUDE7_DEPTH_BACK, mode=Mode.SUBTRACT)

    # Sketch17 → Cut-Extrude8 (cut)
    with BuildSketch(Plane(origin=(0, 0, 0), x_dir=(1, 0, 0), z_dir=(0, 1, 0))):
        with Locations(Location((0, -32.70757493091458, 0), (0, 0, 270))):
            Circle(SKETCH17_R)
        with Locations(Location((0, -32.70757493091458, 0), (0, 0, 270))):
            Circle(SKETCH17_R_2, mode=Mode.SUBTRACT)
    extrude(amount=CUT_EXTRUDE8_DEPTH, mode=Mode.SUBTRACT)


solid = part.part
